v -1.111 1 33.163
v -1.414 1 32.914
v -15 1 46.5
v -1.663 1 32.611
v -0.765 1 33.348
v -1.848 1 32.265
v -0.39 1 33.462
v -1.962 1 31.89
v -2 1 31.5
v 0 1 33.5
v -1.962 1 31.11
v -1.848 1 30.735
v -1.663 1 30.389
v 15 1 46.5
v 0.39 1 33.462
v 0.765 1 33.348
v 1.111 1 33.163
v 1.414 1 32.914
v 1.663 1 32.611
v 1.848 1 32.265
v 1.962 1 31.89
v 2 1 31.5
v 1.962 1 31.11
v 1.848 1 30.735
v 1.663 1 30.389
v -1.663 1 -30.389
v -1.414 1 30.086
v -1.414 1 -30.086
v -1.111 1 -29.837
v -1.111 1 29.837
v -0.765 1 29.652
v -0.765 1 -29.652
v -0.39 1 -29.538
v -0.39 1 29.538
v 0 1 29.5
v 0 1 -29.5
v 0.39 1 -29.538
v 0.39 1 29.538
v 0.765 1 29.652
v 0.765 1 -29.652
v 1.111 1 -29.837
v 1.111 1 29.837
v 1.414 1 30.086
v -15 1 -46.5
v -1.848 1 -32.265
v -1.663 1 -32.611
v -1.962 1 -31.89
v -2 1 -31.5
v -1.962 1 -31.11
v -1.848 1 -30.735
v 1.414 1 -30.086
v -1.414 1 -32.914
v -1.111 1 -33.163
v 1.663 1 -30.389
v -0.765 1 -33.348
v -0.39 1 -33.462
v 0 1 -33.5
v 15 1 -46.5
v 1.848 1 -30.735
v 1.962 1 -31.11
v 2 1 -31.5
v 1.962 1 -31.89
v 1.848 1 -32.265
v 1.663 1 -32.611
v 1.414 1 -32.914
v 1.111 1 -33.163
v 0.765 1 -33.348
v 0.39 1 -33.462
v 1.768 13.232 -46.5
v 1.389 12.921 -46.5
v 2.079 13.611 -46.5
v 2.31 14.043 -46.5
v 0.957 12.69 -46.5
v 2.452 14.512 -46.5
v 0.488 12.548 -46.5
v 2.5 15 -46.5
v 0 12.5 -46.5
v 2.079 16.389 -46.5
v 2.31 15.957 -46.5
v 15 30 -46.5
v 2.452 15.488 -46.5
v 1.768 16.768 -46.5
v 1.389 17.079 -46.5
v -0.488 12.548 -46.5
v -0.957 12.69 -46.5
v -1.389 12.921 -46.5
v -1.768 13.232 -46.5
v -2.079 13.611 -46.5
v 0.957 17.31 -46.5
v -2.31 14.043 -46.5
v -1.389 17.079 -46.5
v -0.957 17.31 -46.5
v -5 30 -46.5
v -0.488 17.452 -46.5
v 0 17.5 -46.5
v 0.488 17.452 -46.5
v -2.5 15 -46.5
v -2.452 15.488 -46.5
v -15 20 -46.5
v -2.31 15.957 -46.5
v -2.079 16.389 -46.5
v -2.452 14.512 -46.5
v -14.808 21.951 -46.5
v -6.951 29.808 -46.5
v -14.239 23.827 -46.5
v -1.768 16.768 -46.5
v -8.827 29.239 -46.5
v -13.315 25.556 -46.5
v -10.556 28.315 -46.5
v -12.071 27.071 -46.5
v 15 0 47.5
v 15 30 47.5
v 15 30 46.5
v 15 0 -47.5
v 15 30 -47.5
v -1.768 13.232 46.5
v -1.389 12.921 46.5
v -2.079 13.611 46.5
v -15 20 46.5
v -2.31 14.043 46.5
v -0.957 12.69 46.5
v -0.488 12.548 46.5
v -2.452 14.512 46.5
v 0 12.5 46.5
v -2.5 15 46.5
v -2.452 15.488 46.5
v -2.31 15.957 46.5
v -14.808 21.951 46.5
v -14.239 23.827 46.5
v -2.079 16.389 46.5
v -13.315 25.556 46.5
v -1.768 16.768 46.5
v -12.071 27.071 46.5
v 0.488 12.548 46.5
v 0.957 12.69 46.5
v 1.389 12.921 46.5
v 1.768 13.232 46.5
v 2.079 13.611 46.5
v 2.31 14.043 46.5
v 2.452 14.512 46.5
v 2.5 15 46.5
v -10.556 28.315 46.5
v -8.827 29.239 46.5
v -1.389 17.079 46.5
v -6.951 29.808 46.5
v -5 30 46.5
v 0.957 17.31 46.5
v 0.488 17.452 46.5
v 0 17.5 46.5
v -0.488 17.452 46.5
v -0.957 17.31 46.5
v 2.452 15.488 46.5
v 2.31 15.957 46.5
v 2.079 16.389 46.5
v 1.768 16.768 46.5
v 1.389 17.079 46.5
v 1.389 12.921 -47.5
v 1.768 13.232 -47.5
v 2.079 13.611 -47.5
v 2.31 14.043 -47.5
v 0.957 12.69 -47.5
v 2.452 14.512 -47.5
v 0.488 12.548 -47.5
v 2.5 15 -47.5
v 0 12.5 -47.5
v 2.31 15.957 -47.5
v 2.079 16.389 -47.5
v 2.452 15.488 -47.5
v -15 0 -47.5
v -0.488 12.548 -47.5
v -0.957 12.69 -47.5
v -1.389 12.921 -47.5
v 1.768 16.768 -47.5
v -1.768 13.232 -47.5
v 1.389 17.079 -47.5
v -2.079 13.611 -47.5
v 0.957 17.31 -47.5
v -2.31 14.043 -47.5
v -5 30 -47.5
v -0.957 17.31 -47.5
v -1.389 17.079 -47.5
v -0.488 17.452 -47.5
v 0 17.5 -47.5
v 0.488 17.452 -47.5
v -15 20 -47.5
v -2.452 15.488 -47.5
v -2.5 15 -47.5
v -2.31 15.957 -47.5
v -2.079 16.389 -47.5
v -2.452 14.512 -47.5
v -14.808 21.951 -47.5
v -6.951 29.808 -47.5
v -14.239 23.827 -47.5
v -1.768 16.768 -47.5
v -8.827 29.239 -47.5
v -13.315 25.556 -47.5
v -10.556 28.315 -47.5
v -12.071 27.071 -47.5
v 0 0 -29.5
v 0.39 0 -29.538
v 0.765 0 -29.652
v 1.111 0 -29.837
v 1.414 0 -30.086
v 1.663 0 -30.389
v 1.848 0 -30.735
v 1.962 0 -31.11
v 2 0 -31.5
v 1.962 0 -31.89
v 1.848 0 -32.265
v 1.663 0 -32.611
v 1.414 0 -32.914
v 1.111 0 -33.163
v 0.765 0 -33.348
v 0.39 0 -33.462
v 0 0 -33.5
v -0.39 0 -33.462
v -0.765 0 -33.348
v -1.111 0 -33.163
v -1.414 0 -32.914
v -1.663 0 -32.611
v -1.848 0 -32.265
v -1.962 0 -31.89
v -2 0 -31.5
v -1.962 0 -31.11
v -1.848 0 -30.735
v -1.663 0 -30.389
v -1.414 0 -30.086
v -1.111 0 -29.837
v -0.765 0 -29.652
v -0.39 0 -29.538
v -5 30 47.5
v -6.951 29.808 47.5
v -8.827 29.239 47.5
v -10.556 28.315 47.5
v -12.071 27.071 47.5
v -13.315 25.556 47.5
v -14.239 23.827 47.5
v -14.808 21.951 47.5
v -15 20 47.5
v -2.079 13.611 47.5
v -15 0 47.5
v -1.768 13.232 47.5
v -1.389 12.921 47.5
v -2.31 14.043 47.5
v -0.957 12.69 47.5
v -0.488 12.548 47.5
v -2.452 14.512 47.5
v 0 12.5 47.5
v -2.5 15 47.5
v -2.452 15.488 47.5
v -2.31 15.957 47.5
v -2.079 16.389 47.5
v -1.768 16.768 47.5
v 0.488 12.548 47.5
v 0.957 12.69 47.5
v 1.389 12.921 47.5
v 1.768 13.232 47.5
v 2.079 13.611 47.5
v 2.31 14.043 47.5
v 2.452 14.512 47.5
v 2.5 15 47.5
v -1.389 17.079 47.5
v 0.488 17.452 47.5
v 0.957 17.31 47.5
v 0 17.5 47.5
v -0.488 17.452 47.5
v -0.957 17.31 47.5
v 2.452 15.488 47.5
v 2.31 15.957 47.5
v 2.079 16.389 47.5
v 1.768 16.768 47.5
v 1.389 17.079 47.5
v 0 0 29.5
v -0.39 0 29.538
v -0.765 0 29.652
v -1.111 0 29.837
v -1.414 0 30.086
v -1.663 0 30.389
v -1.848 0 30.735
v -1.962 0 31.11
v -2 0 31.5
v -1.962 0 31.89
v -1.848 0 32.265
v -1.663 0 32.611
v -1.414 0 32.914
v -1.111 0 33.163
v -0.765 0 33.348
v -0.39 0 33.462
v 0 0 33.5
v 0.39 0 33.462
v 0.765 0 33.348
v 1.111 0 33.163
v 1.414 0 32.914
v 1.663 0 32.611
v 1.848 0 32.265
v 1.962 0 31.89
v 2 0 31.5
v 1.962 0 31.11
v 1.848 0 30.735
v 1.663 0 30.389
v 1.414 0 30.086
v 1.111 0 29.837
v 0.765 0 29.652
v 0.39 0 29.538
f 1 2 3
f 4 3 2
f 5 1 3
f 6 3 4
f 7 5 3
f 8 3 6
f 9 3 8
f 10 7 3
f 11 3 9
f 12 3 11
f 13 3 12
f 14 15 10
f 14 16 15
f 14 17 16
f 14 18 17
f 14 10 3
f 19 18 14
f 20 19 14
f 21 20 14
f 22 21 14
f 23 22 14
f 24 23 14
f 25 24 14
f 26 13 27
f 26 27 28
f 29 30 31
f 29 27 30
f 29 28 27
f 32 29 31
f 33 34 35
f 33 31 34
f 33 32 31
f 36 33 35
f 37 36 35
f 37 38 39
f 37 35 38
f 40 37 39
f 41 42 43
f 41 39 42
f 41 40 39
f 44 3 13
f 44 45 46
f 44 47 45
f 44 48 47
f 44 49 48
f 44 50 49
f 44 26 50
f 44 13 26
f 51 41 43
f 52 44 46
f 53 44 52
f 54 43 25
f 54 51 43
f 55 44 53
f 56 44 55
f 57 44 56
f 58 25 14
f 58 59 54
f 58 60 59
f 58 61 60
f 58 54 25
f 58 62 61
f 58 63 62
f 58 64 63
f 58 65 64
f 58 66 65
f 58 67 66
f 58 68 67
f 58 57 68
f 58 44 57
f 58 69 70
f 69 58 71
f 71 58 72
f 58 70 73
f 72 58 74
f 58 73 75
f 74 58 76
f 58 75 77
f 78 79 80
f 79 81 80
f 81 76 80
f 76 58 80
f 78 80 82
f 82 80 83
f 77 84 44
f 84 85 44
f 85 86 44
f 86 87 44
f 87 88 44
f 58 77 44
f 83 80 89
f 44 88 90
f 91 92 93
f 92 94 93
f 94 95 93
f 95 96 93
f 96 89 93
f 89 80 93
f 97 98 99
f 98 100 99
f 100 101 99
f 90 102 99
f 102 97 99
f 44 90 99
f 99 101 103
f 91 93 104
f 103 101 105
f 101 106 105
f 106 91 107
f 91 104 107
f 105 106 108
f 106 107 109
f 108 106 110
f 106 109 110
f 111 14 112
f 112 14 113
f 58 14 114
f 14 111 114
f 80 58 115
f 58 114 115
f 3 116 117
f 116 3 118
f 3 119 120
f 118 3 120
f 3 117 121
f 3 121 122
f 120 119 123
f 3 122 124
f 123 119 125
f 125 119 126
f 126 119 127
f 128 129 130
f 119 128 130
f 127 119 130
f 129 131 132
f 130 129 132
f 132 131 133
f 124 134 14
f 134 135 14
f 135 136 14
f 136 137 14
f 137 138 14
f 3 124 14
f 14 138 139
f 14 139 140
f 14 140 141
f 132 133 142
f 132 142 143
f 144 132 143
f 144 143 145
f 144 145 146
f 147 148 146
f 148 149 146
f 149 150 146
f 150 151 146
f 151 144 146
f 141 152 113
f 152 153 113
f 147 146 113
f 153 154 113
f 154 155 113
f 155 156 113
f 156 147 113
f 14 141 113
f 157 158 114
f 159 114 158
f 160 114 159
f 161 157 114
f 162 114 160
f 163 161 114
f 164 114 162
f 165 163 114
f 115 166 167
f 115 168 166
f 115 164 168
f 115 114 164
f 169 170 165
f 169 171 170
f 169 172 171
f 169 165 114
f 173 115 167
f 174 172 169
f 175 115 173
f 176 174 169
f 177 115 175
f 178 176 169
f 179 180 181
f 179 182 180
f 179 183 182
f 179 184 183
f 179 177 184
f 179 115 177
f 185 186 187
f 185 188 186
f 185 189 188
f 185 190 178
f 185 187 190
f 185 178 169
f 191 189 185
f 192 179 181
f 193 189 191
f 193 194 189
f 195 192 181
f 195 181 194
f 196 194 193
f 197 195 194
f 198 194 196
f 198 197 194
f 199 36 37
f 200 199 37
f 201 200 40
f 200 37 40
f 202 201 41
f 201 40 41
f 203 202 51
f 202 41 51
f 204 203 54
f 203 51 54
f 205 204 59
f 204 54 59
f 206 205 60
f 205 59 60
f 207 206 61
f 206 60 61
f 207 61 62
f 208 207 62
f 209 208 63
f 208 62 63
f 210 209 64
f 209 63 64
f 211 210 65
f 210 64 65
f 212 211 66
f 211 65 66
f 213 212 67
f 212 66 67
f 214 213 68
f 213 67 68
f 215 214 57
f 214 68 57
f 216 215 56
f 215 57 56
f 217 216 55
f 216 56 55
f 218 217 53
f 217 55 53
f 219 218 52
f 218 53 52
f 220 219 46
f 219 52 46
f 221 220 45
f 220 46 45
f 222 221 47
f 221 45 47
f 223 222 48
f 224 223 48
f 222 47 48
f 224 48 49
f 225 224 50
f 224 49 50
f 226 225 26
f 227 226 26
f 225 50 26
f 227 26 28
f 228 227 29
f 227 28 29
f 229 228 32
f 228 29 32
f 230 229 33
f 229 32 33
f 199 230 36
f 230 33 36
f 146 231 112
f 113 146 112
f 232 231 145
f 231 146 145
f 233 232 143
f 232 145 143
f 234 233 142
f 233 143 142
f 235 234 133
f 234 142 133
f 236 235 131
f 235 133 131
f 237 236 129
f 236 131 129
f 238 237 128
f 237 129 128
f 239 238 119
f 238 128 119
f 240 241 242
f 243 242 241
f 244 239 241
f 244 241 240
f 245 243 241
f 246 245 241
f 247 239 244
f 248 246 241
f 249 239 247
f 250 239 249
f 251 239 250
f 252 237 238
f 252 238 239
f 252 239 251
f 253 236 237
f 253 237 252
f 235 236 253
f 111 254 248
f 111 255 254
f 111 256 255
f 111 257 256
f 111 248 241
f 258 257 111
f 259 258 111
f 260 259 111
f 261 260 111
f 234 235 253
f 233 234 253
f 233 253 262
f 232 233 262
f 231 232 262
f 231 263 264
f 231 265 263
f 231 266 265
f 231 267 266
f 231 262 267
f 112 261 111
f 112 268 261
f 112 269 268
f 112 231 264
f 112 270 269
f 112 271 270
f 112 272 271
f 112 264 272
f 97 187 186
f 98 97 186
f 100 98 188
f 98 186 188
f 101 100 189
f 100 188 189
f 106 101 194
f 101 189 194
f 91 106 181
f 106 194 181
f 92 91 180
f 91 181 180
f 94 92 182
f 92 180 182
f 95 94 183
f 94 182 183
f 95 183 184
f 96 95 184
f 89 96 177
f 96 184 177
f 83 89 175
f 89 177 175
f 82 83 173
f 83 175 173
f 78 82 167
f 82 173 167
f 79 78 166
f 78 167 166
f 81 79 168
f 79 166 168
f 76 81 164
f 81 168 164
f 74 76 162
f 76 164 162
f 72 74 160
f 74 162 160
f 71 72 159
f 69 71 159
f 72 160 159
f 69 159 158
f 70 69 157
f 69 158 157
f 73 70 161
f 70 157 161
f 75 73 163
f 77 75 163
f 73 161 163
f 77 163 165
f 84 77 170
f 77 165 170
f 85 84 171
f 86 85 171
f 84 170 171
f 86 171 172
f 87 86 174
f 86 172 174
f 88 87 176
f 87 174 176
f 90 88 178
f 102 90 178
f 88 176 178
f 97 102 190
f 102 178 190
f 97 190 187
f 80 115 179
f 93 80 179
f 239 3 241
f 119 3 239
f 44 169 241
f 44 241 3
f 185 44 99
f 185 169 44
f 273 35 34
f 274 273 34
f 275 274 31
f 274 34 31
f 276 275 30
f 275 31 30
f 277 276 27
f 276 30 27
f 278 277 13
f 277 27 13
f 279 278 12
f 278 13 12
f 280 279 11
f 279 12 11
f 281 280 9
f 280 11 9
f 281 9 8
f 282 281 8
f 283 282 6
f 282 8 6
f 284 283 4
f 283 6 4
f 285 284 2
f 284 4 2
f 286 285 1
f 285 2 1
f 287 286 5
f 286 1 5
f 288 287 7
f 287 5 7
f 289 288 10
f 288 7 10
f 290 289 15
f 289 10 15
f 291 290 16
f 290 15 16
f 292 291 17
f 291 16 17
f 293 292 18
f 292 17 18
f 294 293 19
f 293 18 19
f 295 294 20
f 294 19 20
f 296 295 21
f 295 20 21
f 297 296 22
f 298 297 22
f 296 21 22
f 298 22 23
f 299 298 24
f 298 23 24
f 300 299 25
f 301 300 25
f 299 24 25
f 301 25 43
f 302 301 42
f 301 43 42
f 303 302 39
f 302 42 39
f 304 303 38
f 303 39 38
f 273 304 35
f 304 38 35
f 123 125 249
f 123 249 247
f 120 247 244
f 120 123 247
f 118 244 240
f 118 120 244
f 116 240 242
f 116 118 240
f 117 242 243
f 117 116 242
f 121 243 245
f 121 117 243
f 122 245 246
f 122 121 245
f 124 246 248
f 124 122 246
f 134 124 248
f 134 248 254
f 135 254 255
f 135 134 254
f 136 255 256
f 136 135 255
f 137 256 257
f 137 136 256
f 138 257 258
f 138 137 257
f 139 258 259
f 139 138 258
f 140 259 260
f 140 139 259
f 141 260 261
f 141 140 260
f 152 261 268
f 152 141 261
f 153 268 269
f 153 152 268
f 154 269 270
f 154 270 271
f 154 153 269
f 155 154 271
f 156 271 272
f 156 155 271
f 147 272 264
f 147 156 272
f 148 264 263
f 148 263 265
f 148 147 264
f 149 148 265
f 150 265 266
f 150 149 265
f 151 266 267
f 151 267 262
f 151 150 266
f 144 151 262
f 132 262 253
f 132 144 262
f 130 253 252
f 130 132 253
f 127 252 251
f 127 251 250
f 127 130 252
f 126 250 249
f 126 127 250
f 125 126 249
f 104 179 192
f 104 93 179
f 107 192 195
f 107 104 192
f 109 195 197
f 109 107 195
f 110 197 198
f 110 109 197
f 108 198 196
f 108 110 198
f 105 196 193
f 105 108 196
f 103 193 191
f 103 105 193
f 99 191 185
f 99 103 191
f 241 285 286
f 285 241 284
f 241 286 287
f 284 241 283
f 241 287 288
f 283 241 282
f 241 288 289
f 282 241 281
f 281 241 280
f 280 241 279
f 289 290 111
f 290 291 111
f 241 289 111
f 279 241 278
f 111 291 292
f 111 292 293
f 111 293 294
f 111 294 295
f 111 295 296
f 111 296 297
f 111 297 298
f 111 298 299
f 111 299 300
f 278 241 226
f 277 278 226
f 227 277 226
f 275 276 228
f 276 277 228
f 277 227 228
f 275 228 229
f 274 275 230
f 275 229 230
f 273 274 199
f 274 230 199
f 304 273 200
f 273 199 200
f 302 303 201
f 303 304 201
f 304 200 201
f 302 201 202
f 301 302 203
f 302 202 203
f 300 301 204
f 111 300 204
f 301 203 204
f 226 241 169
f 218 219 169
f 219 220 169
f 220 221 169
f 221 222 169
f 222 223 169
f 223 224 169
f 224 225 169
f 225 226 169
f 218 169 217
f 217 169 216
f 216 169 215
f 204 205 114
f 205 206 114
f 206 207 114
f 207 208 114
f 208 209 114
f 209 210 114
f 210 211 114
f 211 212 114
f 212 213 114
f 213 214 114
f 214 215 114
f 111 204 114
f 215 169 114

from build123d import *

# Parameters (mm, degrees)
CROQUIS2_W              = 30
CROQUIS2_H              = 95
SALIENTE_EXTRUIR1_DEPTH = 1
CROQUIS5_W              = 30
CROQUIS5_H              = 29
SALIENTE_EXTRUIR2_DEPTH = 1
CROQUIS6_W              = 30
CROQUIS6_H              = 29
SALIENTE_EXTRUIR3_DEPTH = 1
CROQUIS7_R              = 2.5
CORTAR_EXTRUIR1_DEPTH   = 1
CORTAR_EXTRUIR2_START   = -1
CROQUIS8_R              = 2.5
CORTAR_EXTRUIR2_DEPTH   = 1
REDONDEO1_R             = 10
CROQUIS9_R              = 2
CORTAR_EXTRUIR3_DEPTH   = 1


with BuildPart() as part:
    # Croquis2 → Saliente-Extruir1 (new body)
    with BuildSketch(Plane(origin=(0, 0, 0), x_dir=(1, 0, 0), z_dir=(0, 1, 0))):
        Rectangle(CROQUIS2_W, CROQUIS2_H)
    extrude(amount=SALIENTE_EXTRUIR1_DEPTH)

    # Croquis5 → Saliente-Extruir2 (add)
    with BuildSketch(Plane.XY.offset(47.5)):
        with Locations((0, 15.5)):
            Rectangle(CROQUIS5_W, CROQUIS5_H)
    extrude(amount=-SALIENTE_EXTRUIR2_DEPTH)

    # Croquis6 → Saliente-Extruir3 (add)
    with BuildSketch(Plane(origin=(0, 0, -47.5), x_dir=(-1, 0, 0), z_dir=(0, 0, -1))):
        with Locations((0, 15.5)):
            Rectangle(CROQUIS6_W, CROQUIS6_H)
    extrude(amount=-SALIENTE_EXTRUIR3_DEPTH)

    # Croquis7 → Cortar-Extruir1 (cut)
    with BuildSketch(Plane(origin=(0, 0, -47.5), x_dir=(-1, 0, 0), z_dir=(0, 0, -1))):
        with Locations((0, 15)):
            Circle(CROQUIS7_R)
    extrude(amount=-CORTAR_EXTRUIR1_DEPTH, mode=Mode.SUBTRACT)

    # Croquis8 → Cortar-Extruir2 (cut)
    with BuildSketch(Plane.XY.offset(47.5).offset(CORTAR_EXTRUIR2_START)):
        with Locations(Location((0, 15, 0), (0, 0, 180))):
            Circle(CROQUIS8_R)
    extrude(amount=CORTAR_EXTRUIR2_DEPTH, mode=Mode.SUBTRACT)

    # Redondeo1
    redondeo1_edges = [part.edges().sort_by_distance(p)[0] for p in [
        (-15, 30, 47),
        (-15, 30, -47),
    ]]
    fillet(redondeo1_edges, radius=REDONDEO1_R)

    # Croquis9 → Cortar-Extruir3 (cut)
    with BuildSketch(Plane(origin=(0, 1, 0), x_dir=(1, 0, 0), z_dir=(0, 1, 0))):
        with Locations(Location((0, 31.5, 0), (0, 0, 270))):
            Circle(CROQUIS9_R)
        with Locations(Location((0, -31.5, 0), (0, 0, 90))):
            Circle(CROQUIS9_R)
    extrude(amount=-CORTAR_EXTRUIR3_DEPTH, mode=Mode.SUBTRACT)


solid = part.part
